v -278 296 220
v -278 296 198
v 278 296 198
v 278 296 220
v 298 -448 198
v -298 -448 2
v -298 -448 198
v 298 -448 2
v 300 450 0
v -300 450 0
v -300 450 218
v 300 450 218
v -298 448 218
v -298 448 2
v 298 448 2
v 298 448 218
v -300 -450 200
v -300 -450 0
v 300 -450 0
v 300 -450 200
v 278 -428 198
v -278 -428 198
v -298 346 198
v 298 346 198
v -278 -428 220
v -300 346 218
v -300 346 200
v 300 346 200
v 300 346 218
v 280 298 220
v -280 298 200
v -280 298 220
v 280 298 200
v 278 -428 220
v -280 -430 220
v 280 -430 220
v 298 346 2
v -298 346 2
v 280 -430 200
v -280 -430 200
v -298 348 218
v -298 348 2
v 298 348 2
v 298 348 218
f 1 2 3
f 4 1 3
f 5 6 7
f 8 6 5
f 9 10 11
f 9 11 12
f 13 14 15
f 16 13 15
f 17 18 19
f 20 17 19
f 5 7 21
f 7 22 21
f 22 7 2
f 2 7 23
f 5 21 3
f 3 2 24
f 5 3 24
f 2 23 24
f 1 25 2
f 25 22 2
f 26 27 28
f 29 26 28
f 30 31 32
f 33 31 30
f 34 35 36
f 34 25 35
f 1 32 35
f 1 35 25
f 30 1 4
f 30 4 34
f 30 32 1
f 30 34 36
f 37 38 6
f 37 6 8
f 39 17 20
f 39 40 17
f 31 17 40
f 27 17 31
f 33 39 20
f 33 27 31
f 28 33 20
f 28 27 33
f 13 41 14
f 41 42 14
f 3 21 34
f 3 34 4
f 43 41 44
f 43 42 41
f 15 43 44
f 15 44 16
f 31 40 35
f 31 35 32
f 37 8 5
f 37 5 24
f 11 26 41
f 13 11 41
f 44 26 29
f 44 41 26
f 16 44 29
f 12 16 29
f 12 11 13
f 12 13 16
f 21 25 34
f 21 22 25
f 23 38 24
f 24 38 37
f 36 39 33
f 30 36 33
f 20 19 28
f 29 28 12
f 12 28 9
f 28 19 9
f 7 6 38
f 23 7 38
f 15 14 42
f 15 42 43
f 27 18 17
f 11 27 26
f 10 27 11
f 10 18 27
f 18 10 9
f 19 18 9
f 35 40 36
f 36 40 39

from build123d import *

# Parameters (mm, degrees)
SKETCH1_W           = 600
SKETCH1_H           = 900
BOSS_EXTRUDE1_DEPTH = 200
SHELL1_T            = -2
SKETCH2_W           = 596
SKETCH2_H           = 2
BOSS_EXTRUDE2_DEPTH = 198
SKETCH3_W           = 596
SKETCH3_H           = 794
SKETCH3_W_2         = 556
SKETCH3_H_2         = 724
BOSS_EXTRUDE3_DEPTH = 2
SKETCH4_W           = 560
SKETCH4_H           = 728
SKETCH4_W_2         = 556
SKETCH4_H_2         = 724
BOSS_EXTRUDE4_DEPTH = 20
SKETCH5_W           = 600
SKETCH5_H           = 104
SKETCH5_W_2         = 596
SKETCH5_H_2         = 100
BOSS_EXTRUDE5_DEPTH = 18


with BuildPart() as part:
    # Sketch1 → Boss-Extrude1 (new body)
    with BuildSketch(Plane.XY):
        Rectangle(SKETCH1_W, SKETCH1_H)
    extrude(amount=BOSS_EXTRUDE1_DEPTH)

    # Shell1
    shell1_openings = [part.faces().sort_by_distance(p)[0] for p in [
        (0, 0, 200),
    ]]
    offset(amount=SHELL1_T, openings=shell1_openings, kind=Kind.INTERSECTION)

    # Sketch2 → Boss-Extrude2 (add)
    with BuildSketch(Plane.XY.offset(2)):
        with Locations((0, 347)):
            Rectangle(SKETCH2_W, SKETCH2_H)
    extrude(amount=BOSS_EXTRUDE2_DEPTH)

    # Sketch3 → Boss-Extrude3 (add)
    with BuildSketch(Plane.XY.offset(200)):
        with Locations((0, -51)):
            Rectangle(SKETCH3_W, SKETCH3_H)
        with Locations((0, -66)):
            Rectangle(SKETCH3_W_2, SKETCH3_H_2, mode=Mode.SUBTRACT)
    extrude(amount=-BOSS_EXTRUDE3_DEPTH)

    # Sketch4 → Boss-Extrude4 (add)
    with BuildSketch(Plane.XY.offset(200)):
        with Locations((0, -66)):
            Rectangle(SKETCH4_W, SKETCH4_H)
        with Locations((0, -66)):
            Rectangle(SKETCH4_W_2, SKETCH4_H_2, mode=Mode.SUBTRACT)
    extrude(amount=BOSS_EXTRUDE4_DEPTH)

    # Sketch5 → Boss-Extrude5 (add)
    with BuildSketch(Plane.XY.offset(200)):
        with Locations((0, 398)):
            Rectangle(SKETCH5_W, SKETCH5_H)
        with Locations((0, 398)):
            Rectangle(SKETCH5_W_2, SKETCH5_H_2, mode=Mode.SUBTRACT)
    extrude(amount=BOSS_EXTRUDE5_DEPTH)


solid = part.part
